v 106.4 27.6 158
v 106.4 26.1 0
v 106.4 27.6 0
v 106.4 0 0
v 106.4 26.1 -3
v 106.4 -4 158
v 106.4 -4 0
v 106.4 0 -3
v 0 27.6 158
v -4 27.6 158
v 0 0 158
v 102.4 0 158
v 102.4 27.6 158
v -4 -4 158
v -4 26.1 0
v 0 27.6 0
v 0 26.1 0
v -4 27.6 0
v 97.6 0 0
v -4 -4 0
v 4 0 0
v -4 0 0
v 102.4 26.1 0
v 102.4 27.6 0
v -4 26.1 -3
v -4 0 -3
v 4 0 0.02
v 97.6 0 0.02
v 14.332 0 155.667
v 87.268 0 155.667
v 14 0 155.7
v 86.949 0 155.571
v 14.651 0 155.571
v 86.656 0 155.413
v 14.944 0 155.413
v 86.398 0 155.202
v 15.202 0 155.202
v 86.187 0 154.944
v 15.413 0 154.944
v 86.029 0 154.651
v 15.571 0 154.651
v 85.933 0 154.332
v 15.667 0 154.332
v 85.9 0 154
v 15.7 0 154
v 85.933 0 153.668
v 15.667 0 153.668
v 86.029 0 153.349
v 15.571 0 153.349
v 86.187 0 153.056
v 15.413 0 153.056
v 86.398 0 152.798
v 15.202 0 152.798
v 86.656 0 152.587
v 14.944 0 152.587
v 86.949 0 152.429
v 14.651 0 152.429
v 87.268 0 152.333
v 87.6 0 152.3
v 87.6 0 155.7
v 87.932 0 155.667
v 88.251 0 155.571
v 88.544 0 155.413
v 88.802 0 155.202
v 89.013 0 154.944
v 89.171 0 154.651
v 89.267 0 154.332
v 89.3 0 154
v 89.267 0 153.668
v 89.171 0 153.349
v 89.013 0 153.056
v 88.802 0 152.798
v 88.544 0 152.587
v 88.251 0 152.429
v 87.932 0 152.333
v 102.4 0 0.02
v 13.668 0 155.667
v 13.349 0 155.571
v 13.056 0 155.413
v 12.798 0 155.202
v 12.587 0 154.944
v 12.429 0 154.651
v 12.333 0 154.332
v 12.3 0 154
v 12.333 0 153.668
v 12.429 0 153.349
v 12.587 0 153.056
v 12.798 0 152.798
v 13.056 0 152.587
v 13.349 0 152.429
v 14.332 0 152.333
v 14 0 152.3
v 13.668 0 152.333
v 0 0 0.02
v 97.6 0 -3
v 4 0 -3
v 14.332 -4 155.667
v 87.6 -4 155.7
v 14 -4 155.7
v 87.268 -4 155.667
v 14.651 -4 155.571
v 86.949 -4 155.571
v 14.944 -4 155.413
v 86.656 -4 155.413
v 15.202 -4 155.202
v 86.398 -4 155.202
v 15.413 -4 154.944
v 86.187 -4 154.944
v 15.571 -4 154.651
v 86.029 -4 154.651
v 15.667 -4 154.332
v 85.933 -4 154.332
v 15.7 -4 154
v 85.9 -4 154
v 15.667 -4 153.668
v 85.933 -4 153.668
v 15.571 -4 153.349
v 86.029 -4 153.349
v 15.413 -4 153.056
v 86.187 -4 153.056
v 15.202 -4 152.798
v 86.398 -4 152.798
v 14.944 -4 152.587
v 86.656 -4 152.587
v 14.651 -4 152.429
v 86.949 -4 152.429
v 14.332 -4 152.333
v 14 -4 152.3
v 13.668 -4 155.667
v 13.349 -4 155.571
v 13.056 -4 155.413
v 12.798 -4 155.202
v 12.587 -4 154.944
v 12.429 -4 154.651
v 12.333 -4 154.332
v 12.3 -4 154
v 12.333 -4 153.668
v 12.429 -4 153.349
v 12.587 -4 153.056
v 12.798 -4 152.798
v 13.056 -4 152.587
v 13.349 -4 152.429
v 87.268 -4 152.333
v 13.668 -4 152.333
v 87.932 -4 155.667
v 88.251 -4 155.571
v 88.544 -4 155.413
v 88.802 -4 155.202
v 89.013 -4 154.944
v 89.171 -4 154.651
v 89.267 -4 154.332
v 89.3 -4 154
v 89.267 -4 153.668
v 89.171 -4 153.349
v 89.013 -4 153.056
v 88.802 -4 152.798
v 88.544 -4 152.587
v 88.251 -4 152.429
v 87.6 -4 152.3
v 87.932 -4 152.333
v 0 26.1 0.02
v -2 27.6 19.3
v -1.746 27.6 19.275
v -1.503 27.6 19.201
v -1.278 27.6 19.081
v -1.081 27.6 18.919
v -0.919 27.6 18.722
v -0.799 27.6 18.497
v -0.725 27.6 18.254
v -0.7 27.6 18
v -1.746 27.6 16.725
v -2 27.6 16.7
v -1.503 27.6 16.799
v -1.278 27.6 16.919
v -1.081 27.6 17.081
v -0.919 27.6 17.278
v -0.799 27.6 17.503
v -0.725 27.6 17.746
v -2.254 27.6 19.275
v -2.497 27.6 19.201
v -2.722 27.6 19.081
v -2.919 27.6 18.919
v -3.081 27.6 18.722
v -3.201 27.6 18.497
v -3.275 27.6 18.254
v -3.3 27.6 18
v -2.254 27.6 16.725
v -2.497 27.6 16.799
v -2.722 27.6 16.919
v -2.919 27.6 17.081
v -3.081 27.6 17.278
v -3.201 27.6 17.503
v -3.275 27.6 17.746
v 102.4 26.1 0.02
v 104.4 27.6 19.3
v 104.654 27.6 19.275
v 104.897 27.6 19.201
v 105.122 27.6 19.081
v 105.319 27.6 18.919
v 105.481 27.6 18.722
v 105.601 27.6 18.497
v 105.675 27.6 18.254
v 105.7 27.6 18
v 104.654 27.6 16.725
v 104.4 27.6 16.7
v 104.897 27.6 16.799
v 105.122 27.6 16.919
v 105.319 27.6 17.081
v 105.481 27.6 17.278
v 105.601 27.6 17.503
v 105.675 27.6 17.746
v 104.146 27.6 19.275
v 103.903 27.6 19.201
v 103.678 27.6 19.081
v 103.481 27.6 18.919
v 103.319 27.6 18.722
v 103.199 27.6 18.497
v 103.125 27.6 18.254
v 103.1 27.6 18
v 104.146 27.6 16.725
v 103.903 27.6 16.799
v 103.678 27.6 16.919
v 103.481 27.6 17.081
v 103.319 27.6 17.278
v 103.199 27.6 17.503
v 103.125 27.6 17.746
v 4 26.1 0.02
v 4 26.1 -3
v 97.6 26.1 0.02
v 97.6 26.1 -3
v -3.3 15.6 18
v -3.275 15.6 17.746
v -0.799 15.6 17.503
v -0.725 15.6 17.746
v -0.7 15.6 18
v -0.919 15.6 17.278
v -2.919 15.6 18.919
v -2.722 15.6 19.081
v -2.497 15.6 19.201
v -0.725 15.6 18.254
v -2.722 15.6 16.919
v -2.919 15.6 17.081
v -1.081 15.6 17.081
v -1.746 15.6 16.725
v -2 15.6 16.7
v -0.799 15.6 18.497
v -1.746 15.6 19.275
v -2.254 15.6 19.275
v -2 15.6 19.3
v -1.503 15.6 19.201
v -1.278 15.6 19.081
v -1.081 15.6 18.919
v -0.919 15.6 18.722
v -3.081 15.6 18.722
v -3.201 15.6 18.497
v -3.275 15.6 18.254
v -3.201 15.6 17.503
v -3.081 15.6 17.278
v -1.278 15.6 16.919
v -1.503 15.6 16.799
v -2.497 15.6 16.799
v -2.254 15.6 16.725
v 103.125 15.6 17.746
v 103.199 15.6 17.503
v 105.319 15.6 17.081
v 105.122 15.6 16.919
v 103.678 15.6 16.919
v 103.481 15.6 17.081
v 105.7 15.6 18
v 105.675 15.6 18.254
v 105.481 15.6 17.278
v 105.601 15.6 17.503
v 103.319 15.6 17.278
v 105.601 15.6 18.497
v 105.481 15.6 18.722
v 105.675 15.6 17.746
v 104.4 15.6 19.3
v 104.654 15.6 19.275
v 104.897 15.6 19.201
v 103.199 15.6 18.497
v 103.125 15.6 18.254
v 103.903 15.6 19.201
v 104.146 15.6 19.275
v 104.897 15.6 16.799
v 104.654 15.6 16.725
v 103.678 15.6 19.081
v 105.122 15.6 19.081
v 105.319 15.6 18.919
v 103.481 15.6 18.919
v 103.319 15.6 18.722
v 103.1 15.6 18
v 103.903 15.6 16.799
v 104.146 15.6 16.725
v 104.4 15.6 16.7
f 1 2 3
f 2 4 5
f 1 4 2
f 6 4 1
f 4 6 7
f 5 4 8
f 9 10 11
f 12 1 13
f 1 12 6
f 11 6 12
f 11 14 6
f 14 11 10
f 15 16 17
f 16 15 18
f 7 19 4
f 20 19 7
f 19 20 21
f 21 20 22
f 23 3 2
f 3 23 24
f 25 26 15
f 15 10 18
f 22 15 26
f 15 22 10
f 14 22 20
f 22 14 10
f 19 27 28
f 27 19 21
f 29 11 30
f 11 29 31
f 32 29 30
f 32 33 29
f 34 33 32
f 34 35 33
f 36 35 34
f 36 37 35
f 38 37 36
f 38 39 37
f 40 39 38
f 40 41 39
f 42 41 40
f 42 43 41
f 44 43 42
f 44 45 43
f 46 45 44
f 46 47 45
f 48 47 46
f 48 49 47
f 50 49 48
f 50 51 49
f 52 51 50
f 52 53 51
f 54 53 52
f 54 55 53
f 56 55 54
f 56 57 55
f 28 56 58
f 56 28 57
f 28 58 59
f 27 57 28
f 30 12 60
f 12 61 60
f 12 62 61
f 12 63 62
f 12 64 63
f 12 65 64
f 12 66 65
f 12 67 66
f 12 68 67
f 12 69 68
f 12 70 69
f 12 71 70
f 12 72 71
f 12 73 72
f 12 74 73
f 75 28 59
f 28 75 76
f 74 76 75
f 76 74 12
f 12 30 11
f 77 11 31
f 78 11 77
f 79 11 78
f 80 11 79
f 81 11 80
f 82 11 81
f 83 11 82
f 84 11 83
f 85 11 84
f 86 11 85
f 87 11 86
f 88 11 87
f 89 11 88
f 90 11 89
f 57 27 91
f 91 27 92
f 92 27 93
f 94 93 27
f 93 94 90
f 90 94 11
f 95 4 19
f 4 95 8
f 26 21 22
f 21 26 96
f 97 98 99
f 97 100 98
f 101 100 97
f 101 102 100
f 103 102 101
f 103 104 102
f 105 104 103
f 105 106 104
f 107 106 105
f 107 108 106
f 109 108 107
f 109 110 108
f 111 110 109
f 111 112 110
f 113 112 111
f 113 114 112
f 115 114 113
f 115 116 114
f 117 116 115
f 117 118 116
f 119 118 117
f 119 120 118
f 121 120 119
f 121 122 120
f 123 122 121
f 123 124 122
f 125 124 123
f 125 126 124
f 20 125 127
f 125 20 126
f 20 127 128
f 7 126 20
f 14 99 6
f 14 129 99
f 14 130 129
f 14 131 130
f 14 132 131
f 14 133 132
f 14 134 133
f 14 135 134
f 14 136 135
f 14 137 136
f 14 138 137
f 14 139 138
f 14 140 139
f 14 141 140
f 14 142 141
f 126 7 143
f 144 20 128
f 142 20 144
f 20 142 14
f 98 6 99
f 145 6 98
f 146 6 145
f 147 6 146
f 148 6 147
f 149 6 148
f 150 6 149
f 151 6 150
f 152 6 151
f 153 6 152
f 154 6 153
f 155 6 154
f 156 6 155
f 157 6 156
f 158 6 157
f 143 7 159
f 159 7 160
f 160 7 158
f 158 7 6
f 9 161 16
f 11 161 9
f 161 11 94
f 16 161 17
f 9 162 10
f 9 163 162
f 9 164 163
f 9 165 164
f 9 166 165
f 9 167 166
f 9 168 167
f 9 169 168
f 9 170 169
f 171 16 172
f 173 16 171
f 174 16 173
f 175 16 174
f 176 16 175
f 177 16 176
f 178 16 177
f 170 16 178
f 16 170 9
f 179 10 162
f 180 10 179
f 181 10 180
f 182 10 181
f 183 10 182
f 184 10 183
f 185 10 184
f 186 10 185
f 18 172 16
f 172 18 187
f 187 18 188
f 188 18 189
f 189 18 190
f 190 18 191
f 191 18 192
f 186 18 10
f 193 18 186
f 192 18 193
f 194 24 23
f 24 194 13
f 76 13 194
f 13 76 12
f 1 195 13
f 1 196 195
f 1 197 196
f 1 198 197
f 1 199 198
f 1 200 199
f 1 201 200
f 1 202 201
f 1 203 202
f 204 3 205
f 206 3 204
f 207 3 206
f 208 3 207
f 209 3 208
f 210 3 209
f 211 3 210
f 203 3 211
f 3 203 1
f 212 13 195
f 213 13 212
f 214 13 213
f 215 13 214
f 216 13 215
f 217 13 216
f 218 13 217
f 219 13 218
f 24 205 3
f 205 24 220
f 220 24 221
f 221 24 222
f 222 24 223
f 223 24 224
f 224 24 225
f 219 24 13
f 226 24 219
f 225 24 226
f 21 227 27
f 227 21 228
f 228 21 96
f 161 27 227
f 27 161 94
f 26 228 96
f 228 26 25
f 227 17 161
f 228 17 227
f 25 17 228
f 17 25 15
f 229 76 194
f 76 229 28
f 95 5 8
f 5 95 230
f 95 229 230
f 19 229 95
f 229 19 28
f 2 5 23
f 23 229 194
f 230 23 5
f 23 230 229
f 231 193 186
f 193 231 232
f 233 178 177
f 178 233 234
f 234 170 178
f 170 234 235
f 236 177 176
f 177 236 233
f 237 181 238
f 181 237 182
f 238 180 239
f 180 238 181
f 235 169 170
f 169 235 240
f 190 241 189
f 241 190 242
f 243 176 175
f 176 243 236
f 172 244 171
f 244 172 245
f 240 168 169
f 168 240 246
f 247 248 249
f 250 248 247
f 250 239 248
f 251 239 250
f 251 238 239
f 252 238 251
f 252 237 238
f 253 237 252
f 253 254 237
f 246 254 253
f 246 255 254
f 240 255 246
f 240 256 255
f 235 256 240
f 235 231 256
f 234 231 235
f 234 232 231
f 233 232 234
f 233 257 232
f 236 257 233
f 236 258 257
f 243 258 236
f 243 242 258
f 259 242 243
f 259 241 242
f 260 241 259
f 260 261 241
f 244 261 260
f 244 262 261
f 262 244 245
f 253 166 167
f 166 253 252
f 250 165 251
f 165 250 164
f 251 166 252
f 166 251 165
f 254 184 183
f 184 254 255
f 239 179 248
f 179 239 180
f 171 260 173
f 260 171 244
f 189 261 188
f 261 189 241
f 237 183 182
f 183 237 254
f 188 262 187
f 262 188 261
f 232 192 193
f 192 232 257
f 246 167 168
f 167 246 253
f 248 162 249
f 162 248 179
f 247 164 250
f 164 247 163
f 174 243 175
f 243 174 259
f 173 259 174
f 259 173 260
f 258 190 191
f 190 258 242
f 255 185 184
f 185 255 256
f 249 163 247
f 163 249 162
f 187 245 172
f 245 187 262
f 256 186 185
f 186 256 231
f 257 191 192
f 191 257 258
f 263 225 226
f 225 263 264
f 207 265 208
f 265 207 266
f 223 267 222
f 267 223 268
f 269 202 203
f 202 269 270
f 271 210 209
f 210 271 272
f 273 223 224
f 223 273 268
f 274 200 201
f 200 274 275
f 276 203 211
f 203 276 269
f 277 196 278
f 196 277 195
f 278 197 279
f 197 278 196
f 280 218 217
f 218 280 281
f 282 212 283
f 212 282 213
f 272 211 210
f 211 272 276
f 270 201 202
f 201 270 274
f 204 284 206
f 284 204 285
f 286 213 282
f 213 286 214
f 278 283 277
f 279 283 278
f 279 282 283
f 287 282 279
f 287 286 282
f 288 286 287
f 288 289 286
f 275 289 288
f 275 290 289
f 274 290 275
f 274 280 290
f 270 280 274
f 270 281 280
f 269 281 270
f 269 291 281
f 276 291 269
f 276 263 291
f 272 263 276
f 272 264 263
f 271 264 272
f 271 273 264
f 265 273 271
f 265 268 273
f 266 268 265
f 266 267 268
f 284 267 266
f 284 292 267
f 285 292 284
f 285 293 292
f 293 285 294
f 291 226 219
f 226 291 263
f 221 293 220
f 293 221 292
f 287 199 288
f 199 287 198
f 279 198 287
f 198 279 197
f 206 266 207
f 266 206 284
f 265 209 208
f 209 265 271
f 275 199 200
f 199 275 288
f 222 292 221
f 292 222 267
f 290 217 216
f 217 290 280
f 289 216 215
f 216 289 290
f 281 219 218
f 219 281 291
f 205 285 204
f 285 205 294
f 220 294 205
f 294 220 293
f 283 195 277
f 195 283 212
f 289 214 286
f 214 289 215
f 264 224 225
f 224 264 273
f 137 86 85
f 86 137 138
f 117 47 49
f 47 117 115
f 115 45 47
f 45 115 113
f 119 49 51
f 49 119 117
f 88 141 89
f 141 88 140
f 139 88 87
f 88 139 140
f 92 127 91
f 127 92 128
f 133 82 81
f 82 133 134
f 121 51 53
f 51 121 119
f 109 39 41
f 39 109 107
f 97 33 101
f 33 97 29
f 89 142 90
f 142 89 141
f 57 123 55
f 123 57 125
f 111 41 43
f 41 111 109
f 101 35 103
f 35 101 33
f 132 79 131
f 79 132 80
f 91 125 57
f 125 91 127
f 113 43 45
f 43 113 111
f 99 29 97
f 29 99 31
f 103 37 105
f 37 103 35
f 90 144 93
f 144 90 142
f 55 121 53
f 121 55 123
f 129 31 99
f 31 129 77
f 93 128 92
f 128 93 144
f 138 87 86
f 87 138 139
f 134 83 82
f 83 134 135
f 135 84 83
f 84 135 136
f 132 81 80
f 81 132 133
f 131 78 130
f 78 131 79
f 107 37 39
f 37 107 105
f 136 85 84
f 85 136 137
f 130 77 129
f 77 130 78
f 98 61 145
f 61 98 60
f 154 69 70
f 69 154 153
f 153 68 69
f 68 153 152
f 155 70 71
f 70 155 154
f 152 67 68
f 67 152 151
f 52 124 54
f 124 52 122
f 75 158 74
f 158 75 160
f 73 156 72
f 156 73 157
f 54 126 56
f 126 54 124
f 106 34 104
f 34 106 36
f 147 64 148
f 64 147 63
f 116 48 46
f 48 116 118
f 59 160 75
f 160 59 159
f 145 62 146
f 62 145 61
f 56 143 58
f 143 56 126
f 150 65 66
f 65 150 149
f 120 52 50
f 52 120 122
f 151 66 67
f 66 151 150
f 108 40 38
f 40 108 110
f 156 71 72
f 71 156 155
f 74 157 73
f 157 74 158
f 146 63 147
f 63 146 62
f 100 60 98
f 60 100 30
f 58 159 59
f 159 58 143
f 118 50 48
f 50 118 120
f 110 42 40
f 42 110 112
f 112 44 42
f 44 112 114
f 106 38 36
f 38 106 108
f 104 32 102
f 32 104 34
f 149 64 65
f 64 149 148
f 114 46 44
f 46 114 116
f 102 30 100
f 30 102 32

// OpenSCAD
// file: params.scad
// Общие размеры первой итерации: один отсек 3.5" и детали вокруг него.
// Корпус диска — SFF-8301, таблица 3-1, класс высоты 26.10 мм (максимум).
// Положение разъёма SATA сюда не зашито: его снимают калибром gauge.scad
// с конкретного диска и только потом переносят в окно салазок.

drive_width = 101.60;
drive_height = 26.10;
drive_length = 147.00;

wall = 4.0;
floor_t = 4.0;
lip_t = 3.0;
nib = 4.0;
side_clearance = 0.8;
top_clearance = 1.5;

front_gap = 3.0;
plate_t = 8.0;
front_extra = front_gap + plate_t;

pusher_d = 4.4;
m3_clear = 3.4;
m3_pilot = 2.6;
m3_nut_af = 5.5;
m3_nut_t = 2.8;

cavity_w = drive_width + side_clearance;
outer_w = cavity_w + 2 * wall;
wall_h = drive_height + top_clearance;
body_z = drive_length + front_extra;

strap_z = 18;
strap_t = 4.0;
strap_foot = 14.0;

plate_screw_x = [14, drive_width - 14];
plate_z0 = drive_length + front_gap;
plate_screw_z = plate_z0 + plate_t / 2;
plate_bar_h = 10;
tower_w = 28;
tower_x = drive_width / 2 - tower_w / 2;

sled_w = 78;
sled_h = 48;
sled_t = 8;
sled_window_w = 50;
sled_window_h = 18;
sled_hole_inset = 6;

$fn = 32;
// main file
// Отсек одного диска 3.5".
// X = 0 у борта-упора, Y = 0 на полу, Z = 0 на задней плоскости диска, +Z к передней.
// Задняя сторона открыта: разъём приезжает с −Z. Уголки задают заднюю плоскость,
// передний винт поджимает диск к ним.

include <params.scad>

module bay() {
    difference() {
        union() {
            translate([-wall, -floor_t, 0])
                cube([outer_w, floor_t, body_z]);
            translate([-wall, -floor_t, 0])
                cube([wall, floor_t + wall_h, body_z]);
            translate([cavity_w, -floor_t, 0])
                cube([wall, floor_t + wall_h, body_z]);
            // Уголок на всю высоту печатается вместе со стеной. 4 мм от борта —
            // ставка, что разъём дальше; это проверяет калибр.
            translate([-wall, 0, -lip_t])
                cube([wall + nib, drive_height, lip_t + 0.02]);
            translate([drive_width - nib, 0, -lip_t])
                cube([nib + side_clearance + wall, drive_height, lip_t + 0.02]);
        }
        for (x = [-wall / 2, cavity_w + wall / 2]) {
            translate([x, wall_h - 12, strap_z])
                rotate([-90, 0, 0])
                    cylinder(h = 14, d = m3_pilot);
        }
        for (x = plate_screw_x) {
            translate([x, -floor_t - 0.1, plate_screw_z])
                rotate([-90, 0, 0])
                    cylinder(h = floor_t + 0.2, d = m3_clear);
        }
    }
}

bay();
